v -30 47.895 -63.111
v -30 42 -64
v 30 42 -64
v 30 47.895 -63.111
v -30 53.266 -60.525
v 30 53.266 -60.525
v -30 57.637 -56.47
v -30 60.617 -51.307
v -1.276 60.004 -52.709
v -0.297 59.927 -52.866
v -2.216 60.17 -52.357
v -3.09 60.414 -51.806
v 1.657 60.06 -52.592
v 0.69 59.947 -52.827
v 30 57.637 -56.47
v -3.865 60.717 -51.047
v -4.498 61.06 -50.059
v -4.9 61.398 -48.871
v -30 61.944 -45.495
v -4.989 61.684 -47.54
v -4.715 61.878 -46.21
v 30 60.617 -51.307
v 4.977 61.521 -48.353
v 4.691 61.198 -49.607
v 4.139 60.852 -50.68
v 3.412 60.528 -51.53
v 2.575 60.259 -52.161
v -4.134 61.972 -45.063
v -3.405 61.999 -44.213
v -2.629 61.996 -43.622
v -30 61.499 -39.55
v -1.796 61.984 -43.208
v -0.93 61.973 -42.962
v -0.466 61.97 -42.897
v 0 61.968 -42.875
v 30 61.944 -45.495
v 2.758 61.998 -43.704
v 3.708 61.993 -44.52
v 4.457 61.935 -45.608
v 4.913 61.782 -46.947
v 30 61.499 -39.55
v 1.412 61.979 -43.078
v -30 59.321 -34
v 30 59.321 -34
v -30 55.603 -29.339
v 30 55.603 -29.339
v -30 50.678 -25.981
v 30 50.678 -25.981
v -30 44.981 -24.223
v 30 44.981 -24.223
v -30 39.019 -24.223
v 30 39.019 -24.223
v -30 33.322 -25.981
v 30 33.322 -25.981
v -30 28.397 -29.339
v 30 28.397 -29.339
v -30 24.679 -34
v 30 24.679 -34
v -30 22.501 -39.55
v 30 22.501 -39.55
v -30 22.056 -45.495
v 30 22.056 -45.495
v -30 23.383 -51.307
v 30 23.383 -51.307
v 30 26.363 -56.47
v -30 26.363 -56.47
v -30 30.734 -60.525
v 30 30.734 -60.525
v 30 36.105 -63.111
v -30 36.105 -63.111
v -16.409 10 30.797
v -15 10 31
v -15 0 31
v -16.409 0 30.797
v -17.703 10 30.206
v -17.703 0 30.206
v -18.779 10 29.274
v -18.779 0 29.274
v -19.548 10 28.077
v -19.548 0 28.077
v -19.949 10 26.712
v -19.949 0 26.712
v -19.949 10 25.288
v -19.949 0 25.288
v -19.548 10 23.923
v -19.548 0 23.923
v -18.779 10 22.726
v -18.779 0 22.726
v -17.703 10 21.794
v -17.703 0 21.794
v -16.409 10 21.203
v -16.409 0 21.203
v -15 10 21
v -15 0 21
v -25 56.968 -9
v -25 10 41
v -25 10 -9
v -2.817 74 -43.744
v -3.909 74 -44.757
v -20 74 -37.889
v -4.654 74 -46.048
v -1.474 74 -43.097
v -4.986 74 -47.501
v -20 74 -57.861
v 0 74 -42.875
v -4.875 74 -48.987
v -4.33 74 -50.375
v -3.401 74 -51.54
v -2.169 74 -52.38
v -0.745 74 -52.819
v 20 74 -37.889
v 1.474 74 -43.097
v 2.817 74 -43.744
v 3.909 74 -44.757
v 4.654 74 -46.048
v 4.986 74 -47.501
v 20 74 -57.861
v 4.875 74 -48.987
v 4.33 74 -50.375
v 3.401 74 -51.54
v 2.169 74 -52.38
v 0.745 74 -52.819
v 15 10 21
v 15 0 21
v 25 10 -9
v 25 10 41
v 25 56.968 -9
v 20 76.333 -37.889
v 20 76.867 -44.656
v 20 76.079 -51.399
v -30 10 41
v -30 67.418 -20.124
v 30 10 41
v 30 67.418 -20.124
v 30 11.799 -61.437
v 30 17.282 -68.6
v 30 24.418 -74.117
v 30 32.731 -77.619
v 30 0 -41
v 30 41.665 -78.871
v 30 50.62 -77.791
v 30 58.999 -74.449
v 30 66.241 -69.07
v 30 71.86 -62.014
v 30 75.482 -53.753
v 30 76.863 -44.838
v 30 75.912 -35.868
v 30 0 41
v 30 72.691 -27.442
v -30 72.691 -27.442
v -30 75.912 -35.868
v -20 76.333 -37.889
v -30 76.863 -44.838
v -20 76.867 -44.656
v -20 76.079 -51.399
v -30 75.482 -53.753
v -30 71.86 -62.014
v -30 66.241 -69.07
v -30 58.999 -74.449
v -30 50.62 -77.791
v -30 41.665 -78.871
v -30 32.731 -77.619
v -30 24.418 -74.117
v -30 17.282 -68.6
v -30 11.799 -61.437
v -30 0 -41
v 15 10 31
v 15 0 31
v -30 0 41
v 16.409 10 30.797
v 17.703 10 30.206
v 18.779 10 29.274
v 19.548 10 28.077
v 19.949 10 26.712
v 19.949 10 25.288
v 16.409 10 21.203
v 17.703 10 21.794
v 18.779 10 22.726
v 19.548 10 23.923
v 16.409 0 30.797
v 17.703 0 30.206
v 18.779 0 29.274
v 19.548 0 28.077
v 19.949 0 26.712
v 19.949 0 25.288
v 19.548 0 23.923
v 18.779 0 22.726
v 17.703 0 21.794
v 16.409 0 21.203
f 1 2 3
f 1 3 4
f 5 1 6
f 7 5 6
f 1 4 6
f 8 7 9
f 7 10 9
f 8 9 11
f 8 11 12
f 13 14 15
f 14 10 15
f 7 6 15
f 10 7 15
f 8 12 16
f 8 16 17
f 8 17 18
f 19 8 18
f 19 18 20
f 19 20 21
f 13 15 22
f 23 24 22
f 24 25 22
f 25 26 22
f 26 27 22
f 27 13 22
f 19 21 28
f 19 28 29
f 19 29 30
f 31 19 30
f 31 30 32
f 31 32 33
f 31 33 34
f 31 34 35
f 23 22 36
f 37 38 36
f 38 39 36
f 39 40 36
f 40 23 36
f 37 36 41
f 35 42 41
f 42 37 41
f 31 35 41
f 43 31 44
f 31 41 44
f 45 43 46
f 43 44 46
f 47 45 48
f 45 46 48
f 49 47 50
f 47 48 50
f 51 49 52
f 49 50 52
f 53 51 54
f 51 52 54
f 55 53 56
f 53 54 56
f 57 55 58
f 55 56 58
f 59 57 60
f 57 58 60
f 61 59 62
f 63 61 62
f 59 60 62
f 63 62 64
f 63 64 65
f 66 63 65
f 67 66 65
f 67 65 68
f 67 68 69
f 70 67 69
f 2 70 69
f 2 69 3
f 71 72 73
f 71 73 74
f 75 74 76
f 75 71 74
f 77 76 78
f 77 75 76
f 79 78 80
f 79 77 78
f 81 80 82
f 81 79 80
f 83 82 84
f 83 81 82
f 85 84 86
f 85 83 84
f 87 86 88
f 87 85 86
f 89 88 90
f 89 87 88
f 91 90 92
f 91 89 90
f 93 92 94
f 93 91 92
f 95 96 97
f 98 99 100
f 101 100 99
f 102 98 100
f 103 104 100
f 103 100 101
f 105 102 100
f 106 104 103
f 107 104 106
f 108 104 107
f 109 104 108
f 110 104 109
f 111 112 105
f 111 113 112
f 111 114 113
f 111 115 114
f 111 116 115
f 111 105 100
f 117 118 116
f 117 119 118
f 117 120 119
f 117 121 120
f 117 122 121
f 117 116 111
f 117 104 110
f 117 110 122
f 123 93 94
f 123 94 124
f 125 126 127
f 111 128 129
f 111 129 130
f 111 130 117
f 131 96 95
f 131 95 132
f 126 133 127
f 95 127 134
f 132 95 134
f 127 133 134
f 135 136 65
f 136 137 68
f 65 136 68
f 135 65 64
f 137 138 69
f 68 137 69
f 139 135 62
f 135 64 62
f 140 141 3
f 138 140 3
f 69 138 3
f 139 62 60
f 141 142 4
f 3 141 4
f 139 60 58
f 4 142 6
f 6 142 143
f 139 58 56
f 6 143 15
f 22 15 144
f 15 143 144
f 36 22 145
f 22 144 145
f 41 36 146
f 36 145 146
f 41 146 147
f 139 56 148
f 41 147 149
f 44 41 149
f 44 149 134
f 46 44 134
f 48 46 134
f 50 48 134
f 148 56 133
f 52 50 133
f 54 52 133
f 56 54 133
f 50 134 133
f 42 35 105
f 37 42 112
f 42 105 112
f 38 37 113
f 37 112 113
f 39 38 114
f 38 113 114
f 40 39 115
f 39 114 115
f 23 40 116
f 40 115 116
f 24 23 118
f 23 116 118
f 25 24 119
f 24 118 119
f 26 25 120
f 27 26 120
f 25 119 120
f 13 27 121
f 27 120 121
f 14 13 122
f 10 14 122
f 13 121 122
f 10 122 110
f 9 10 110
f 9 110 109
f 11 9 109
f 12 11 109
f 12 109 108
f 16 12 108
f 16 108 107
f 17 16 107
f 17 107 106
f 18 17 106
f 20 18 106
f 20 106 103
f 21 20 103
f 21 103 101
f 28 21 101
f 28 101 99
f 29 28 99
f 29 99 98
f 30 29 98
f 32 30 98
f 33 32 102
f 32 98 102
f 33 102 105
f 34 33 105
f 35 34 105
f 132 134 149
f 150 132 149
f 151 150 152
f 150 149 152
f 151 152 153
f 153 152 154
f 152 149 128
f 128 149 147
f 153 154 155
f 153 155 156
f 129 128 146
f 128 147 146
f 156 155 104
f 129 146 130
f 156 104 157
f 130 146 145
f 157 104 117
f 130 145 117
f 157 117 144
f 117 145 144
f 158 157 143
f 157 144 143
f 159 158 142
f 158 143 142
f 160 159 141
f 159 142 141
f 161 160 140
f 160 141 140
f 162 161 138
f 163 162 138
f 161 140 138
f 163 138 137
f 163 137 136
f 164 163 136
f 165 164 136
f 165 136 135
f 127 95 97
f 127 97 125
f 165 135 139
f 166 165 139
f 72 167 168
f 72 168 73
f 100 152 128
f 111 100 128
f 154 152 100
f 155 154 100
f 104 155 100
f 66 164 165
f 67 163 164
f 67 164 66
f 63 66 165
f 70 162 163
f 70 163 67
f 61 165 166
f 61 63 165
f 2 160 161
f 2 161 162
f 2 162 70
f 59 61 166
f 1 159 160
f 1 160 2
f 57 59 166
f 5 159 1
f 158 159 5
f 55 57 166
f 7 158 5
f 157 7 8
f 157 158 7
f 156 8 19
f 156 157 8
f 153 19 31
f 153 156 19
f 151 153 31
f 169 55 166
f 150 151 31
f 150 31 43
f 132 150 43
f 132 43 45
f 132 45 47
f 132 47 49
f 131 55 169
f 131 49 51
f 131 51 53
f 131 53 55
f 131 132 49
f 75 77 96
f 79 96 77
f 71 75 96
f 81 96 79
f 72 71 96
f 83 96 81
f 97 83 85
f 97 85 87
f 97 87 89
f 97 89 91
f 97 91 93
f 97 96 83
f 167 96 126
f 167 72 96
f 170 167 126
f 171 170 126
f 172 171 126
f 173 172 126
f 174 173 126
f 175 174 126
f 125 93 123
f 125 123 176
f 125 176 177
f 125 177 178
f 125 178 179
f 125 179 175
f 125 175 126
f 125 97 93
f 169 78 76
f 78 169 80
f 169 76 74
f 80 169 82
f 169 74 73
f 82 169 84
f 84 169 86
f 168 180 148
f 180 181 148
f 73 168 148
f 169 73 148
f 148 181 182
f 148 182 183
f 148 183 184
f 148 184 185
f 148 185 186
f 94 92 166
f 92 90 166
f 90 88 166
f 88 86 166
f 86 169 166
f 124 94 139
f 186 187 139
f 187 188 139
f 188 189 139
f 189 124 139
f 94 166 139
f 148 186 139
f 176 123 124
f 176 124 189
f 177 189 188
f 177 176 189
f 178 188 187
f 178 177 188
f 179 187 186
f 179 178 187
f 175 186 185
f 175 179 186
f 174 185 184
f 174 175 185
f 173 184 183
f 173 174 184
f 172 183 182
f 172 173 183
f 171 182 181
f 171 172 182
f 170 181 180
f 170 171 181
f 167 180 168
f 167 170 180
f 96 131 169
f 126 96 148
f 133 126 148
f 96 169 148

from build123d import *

# Parameters (mm, degrees)
SKETCH2_W               = 60
SKETCH2_H               = 82
BOSS_EXTRUDE2_DEPTH     = 10
SKETCH4_R               = 20
BOSS_EXTRUDE3_DEPTH     = 60
SKETCH8_W               = 50
SKETCH8_H               = 50
CUT_EXTRUDE1_DEPTH      = 50
CUT_EXTRUDE2_DEPTH      = 50
SKETCH14_W              = 40
SKETCH14_H              = 23.219607056
CUT_EXTRUDE3_DEPTH      = 3
CUT_EXTRUDE4_REACH      = 114.236
CUT_EXTRUDE4_END_RADIUS = 20
SKETCH15_R              = 5


with BuildPart() as part:
    # Sketch2 → Boss-Extrude2 (new body)
    with BuildSketch(Plane(origin=(0, 0, 0), x_dir=(1, 0, 0), z_dir=(0, 1, 0))):
        Rectangle(SKETCH2_W, SKETCH2_H)
    extrude(amount=BOSS_EXTRUDE2_DEPTH)

    # Sketch4 → Boss-Extrude3 (add, through all)
    with BuildSketch(Plane(origin=(30, 0, 0), x_dir=(0, 0, -1), z_dir=(1, 0, 0))):
        with BuildLine():
            Line((41, 10), (-41, 10))
            Line((-41, 10), (20.123633203, 67.417511832))
            ThreePointArc((20.123633203, 67.417511832), (71.995026669, 62.794453129), (61.436533479, 11.799038106))
            Line((61.436533479, 11.799038106), (41, 0))
            Line((41, 0), (41, 10))
        make_face()
        with Locations((44, 42)):
            Circle(SKETCH4_R, mode=Mode.SUBTRACT)
    extrude(amount=-BOSS_EXTRUDE3_DEPTH)

    # Sketch8 → Cut-Extrude1 (cut)
    with BuildSketch(Plane(origin=(0, 60, 0), x_dir=(1, 0, 0), z_dir=(0, 1, 0))):
        with Locations((0, -16)):
            Rectangle(SKETCH8_W, SKETCH8_H)
    extrude(amount=-CUT_EXTRUDE1_DEPTH, mode=Mode.SUBTRACT)

    # Sketch9 → Cut-Extrude2 (cut)
    with BuildSketch(Plane(origin=(0, 10, 0), x_dir=(1, 0, 0), z_dir=(0, 1, 0))):
        with BuildLine():
            Line((-15, -21), (15, -21))
            ThreePointArc((15, -21), (20, -26), (15, -31))
            Line((15, -31), (-15, -31))
            ThreePointArc((-15, -31), (-20, -26), (-15, -21))
        make_face()
    extrude(amount=-CUT_EXTRUDE2_DEPTH, mode=Mode.SUBTRACT)

    # Sketch14 → Cut-Extrude3 (cut)
    with BuildSketch(Plane(origin=(0, 77, 0), x_dir=(1, 0, 0), z_dir=(0, 1, 0))):
        with Locations((0, 49.498350081)):
            Rectangle(SKETCH14_W, SKETCH14_H)
    extrude(amount=-CUT_EXTRUDE3_DEPTH, mode=Mode.SUBTRACT)

    # Cut-Extrude4: up to this cylinder (the profile starts outside it)
    cut_extrude4_end = Plane(origin=(0, 42, -44), z_dir=(1, 0, 0)) * Cylinder(CUT_EXTRUDE4_END_RADIUS, 269.472, mode=Mode.PRIVATE)
    # Sketch15 → Cut-Extrude4 (cut, up to the surface)
    with BuildSketch(Plane(origin=(0, 74, 0), x_dir=(1, 0, 0), z_dir=(0, 1, 0)), mode=Mode.PRIVATE) as cut_extrude4_sk1:
        with Locations(Location((0, 47.874836009, 0), (0, 0, 270))):
            Circle(SKETCH15_R)
    cut_extrude4_tool1 = extrude(cut_extrude4_sk1.sketch, amount=-CUT_EXTRUDE4_REACH, mode=Mode.PRIVATE) - cut_extrude4_end
    add(cut_extrude4_tool1.solids().sort_by_distance((0, 74, -47.874836))[0], mode=Mode.SUBTRACT)


solid = part.part
